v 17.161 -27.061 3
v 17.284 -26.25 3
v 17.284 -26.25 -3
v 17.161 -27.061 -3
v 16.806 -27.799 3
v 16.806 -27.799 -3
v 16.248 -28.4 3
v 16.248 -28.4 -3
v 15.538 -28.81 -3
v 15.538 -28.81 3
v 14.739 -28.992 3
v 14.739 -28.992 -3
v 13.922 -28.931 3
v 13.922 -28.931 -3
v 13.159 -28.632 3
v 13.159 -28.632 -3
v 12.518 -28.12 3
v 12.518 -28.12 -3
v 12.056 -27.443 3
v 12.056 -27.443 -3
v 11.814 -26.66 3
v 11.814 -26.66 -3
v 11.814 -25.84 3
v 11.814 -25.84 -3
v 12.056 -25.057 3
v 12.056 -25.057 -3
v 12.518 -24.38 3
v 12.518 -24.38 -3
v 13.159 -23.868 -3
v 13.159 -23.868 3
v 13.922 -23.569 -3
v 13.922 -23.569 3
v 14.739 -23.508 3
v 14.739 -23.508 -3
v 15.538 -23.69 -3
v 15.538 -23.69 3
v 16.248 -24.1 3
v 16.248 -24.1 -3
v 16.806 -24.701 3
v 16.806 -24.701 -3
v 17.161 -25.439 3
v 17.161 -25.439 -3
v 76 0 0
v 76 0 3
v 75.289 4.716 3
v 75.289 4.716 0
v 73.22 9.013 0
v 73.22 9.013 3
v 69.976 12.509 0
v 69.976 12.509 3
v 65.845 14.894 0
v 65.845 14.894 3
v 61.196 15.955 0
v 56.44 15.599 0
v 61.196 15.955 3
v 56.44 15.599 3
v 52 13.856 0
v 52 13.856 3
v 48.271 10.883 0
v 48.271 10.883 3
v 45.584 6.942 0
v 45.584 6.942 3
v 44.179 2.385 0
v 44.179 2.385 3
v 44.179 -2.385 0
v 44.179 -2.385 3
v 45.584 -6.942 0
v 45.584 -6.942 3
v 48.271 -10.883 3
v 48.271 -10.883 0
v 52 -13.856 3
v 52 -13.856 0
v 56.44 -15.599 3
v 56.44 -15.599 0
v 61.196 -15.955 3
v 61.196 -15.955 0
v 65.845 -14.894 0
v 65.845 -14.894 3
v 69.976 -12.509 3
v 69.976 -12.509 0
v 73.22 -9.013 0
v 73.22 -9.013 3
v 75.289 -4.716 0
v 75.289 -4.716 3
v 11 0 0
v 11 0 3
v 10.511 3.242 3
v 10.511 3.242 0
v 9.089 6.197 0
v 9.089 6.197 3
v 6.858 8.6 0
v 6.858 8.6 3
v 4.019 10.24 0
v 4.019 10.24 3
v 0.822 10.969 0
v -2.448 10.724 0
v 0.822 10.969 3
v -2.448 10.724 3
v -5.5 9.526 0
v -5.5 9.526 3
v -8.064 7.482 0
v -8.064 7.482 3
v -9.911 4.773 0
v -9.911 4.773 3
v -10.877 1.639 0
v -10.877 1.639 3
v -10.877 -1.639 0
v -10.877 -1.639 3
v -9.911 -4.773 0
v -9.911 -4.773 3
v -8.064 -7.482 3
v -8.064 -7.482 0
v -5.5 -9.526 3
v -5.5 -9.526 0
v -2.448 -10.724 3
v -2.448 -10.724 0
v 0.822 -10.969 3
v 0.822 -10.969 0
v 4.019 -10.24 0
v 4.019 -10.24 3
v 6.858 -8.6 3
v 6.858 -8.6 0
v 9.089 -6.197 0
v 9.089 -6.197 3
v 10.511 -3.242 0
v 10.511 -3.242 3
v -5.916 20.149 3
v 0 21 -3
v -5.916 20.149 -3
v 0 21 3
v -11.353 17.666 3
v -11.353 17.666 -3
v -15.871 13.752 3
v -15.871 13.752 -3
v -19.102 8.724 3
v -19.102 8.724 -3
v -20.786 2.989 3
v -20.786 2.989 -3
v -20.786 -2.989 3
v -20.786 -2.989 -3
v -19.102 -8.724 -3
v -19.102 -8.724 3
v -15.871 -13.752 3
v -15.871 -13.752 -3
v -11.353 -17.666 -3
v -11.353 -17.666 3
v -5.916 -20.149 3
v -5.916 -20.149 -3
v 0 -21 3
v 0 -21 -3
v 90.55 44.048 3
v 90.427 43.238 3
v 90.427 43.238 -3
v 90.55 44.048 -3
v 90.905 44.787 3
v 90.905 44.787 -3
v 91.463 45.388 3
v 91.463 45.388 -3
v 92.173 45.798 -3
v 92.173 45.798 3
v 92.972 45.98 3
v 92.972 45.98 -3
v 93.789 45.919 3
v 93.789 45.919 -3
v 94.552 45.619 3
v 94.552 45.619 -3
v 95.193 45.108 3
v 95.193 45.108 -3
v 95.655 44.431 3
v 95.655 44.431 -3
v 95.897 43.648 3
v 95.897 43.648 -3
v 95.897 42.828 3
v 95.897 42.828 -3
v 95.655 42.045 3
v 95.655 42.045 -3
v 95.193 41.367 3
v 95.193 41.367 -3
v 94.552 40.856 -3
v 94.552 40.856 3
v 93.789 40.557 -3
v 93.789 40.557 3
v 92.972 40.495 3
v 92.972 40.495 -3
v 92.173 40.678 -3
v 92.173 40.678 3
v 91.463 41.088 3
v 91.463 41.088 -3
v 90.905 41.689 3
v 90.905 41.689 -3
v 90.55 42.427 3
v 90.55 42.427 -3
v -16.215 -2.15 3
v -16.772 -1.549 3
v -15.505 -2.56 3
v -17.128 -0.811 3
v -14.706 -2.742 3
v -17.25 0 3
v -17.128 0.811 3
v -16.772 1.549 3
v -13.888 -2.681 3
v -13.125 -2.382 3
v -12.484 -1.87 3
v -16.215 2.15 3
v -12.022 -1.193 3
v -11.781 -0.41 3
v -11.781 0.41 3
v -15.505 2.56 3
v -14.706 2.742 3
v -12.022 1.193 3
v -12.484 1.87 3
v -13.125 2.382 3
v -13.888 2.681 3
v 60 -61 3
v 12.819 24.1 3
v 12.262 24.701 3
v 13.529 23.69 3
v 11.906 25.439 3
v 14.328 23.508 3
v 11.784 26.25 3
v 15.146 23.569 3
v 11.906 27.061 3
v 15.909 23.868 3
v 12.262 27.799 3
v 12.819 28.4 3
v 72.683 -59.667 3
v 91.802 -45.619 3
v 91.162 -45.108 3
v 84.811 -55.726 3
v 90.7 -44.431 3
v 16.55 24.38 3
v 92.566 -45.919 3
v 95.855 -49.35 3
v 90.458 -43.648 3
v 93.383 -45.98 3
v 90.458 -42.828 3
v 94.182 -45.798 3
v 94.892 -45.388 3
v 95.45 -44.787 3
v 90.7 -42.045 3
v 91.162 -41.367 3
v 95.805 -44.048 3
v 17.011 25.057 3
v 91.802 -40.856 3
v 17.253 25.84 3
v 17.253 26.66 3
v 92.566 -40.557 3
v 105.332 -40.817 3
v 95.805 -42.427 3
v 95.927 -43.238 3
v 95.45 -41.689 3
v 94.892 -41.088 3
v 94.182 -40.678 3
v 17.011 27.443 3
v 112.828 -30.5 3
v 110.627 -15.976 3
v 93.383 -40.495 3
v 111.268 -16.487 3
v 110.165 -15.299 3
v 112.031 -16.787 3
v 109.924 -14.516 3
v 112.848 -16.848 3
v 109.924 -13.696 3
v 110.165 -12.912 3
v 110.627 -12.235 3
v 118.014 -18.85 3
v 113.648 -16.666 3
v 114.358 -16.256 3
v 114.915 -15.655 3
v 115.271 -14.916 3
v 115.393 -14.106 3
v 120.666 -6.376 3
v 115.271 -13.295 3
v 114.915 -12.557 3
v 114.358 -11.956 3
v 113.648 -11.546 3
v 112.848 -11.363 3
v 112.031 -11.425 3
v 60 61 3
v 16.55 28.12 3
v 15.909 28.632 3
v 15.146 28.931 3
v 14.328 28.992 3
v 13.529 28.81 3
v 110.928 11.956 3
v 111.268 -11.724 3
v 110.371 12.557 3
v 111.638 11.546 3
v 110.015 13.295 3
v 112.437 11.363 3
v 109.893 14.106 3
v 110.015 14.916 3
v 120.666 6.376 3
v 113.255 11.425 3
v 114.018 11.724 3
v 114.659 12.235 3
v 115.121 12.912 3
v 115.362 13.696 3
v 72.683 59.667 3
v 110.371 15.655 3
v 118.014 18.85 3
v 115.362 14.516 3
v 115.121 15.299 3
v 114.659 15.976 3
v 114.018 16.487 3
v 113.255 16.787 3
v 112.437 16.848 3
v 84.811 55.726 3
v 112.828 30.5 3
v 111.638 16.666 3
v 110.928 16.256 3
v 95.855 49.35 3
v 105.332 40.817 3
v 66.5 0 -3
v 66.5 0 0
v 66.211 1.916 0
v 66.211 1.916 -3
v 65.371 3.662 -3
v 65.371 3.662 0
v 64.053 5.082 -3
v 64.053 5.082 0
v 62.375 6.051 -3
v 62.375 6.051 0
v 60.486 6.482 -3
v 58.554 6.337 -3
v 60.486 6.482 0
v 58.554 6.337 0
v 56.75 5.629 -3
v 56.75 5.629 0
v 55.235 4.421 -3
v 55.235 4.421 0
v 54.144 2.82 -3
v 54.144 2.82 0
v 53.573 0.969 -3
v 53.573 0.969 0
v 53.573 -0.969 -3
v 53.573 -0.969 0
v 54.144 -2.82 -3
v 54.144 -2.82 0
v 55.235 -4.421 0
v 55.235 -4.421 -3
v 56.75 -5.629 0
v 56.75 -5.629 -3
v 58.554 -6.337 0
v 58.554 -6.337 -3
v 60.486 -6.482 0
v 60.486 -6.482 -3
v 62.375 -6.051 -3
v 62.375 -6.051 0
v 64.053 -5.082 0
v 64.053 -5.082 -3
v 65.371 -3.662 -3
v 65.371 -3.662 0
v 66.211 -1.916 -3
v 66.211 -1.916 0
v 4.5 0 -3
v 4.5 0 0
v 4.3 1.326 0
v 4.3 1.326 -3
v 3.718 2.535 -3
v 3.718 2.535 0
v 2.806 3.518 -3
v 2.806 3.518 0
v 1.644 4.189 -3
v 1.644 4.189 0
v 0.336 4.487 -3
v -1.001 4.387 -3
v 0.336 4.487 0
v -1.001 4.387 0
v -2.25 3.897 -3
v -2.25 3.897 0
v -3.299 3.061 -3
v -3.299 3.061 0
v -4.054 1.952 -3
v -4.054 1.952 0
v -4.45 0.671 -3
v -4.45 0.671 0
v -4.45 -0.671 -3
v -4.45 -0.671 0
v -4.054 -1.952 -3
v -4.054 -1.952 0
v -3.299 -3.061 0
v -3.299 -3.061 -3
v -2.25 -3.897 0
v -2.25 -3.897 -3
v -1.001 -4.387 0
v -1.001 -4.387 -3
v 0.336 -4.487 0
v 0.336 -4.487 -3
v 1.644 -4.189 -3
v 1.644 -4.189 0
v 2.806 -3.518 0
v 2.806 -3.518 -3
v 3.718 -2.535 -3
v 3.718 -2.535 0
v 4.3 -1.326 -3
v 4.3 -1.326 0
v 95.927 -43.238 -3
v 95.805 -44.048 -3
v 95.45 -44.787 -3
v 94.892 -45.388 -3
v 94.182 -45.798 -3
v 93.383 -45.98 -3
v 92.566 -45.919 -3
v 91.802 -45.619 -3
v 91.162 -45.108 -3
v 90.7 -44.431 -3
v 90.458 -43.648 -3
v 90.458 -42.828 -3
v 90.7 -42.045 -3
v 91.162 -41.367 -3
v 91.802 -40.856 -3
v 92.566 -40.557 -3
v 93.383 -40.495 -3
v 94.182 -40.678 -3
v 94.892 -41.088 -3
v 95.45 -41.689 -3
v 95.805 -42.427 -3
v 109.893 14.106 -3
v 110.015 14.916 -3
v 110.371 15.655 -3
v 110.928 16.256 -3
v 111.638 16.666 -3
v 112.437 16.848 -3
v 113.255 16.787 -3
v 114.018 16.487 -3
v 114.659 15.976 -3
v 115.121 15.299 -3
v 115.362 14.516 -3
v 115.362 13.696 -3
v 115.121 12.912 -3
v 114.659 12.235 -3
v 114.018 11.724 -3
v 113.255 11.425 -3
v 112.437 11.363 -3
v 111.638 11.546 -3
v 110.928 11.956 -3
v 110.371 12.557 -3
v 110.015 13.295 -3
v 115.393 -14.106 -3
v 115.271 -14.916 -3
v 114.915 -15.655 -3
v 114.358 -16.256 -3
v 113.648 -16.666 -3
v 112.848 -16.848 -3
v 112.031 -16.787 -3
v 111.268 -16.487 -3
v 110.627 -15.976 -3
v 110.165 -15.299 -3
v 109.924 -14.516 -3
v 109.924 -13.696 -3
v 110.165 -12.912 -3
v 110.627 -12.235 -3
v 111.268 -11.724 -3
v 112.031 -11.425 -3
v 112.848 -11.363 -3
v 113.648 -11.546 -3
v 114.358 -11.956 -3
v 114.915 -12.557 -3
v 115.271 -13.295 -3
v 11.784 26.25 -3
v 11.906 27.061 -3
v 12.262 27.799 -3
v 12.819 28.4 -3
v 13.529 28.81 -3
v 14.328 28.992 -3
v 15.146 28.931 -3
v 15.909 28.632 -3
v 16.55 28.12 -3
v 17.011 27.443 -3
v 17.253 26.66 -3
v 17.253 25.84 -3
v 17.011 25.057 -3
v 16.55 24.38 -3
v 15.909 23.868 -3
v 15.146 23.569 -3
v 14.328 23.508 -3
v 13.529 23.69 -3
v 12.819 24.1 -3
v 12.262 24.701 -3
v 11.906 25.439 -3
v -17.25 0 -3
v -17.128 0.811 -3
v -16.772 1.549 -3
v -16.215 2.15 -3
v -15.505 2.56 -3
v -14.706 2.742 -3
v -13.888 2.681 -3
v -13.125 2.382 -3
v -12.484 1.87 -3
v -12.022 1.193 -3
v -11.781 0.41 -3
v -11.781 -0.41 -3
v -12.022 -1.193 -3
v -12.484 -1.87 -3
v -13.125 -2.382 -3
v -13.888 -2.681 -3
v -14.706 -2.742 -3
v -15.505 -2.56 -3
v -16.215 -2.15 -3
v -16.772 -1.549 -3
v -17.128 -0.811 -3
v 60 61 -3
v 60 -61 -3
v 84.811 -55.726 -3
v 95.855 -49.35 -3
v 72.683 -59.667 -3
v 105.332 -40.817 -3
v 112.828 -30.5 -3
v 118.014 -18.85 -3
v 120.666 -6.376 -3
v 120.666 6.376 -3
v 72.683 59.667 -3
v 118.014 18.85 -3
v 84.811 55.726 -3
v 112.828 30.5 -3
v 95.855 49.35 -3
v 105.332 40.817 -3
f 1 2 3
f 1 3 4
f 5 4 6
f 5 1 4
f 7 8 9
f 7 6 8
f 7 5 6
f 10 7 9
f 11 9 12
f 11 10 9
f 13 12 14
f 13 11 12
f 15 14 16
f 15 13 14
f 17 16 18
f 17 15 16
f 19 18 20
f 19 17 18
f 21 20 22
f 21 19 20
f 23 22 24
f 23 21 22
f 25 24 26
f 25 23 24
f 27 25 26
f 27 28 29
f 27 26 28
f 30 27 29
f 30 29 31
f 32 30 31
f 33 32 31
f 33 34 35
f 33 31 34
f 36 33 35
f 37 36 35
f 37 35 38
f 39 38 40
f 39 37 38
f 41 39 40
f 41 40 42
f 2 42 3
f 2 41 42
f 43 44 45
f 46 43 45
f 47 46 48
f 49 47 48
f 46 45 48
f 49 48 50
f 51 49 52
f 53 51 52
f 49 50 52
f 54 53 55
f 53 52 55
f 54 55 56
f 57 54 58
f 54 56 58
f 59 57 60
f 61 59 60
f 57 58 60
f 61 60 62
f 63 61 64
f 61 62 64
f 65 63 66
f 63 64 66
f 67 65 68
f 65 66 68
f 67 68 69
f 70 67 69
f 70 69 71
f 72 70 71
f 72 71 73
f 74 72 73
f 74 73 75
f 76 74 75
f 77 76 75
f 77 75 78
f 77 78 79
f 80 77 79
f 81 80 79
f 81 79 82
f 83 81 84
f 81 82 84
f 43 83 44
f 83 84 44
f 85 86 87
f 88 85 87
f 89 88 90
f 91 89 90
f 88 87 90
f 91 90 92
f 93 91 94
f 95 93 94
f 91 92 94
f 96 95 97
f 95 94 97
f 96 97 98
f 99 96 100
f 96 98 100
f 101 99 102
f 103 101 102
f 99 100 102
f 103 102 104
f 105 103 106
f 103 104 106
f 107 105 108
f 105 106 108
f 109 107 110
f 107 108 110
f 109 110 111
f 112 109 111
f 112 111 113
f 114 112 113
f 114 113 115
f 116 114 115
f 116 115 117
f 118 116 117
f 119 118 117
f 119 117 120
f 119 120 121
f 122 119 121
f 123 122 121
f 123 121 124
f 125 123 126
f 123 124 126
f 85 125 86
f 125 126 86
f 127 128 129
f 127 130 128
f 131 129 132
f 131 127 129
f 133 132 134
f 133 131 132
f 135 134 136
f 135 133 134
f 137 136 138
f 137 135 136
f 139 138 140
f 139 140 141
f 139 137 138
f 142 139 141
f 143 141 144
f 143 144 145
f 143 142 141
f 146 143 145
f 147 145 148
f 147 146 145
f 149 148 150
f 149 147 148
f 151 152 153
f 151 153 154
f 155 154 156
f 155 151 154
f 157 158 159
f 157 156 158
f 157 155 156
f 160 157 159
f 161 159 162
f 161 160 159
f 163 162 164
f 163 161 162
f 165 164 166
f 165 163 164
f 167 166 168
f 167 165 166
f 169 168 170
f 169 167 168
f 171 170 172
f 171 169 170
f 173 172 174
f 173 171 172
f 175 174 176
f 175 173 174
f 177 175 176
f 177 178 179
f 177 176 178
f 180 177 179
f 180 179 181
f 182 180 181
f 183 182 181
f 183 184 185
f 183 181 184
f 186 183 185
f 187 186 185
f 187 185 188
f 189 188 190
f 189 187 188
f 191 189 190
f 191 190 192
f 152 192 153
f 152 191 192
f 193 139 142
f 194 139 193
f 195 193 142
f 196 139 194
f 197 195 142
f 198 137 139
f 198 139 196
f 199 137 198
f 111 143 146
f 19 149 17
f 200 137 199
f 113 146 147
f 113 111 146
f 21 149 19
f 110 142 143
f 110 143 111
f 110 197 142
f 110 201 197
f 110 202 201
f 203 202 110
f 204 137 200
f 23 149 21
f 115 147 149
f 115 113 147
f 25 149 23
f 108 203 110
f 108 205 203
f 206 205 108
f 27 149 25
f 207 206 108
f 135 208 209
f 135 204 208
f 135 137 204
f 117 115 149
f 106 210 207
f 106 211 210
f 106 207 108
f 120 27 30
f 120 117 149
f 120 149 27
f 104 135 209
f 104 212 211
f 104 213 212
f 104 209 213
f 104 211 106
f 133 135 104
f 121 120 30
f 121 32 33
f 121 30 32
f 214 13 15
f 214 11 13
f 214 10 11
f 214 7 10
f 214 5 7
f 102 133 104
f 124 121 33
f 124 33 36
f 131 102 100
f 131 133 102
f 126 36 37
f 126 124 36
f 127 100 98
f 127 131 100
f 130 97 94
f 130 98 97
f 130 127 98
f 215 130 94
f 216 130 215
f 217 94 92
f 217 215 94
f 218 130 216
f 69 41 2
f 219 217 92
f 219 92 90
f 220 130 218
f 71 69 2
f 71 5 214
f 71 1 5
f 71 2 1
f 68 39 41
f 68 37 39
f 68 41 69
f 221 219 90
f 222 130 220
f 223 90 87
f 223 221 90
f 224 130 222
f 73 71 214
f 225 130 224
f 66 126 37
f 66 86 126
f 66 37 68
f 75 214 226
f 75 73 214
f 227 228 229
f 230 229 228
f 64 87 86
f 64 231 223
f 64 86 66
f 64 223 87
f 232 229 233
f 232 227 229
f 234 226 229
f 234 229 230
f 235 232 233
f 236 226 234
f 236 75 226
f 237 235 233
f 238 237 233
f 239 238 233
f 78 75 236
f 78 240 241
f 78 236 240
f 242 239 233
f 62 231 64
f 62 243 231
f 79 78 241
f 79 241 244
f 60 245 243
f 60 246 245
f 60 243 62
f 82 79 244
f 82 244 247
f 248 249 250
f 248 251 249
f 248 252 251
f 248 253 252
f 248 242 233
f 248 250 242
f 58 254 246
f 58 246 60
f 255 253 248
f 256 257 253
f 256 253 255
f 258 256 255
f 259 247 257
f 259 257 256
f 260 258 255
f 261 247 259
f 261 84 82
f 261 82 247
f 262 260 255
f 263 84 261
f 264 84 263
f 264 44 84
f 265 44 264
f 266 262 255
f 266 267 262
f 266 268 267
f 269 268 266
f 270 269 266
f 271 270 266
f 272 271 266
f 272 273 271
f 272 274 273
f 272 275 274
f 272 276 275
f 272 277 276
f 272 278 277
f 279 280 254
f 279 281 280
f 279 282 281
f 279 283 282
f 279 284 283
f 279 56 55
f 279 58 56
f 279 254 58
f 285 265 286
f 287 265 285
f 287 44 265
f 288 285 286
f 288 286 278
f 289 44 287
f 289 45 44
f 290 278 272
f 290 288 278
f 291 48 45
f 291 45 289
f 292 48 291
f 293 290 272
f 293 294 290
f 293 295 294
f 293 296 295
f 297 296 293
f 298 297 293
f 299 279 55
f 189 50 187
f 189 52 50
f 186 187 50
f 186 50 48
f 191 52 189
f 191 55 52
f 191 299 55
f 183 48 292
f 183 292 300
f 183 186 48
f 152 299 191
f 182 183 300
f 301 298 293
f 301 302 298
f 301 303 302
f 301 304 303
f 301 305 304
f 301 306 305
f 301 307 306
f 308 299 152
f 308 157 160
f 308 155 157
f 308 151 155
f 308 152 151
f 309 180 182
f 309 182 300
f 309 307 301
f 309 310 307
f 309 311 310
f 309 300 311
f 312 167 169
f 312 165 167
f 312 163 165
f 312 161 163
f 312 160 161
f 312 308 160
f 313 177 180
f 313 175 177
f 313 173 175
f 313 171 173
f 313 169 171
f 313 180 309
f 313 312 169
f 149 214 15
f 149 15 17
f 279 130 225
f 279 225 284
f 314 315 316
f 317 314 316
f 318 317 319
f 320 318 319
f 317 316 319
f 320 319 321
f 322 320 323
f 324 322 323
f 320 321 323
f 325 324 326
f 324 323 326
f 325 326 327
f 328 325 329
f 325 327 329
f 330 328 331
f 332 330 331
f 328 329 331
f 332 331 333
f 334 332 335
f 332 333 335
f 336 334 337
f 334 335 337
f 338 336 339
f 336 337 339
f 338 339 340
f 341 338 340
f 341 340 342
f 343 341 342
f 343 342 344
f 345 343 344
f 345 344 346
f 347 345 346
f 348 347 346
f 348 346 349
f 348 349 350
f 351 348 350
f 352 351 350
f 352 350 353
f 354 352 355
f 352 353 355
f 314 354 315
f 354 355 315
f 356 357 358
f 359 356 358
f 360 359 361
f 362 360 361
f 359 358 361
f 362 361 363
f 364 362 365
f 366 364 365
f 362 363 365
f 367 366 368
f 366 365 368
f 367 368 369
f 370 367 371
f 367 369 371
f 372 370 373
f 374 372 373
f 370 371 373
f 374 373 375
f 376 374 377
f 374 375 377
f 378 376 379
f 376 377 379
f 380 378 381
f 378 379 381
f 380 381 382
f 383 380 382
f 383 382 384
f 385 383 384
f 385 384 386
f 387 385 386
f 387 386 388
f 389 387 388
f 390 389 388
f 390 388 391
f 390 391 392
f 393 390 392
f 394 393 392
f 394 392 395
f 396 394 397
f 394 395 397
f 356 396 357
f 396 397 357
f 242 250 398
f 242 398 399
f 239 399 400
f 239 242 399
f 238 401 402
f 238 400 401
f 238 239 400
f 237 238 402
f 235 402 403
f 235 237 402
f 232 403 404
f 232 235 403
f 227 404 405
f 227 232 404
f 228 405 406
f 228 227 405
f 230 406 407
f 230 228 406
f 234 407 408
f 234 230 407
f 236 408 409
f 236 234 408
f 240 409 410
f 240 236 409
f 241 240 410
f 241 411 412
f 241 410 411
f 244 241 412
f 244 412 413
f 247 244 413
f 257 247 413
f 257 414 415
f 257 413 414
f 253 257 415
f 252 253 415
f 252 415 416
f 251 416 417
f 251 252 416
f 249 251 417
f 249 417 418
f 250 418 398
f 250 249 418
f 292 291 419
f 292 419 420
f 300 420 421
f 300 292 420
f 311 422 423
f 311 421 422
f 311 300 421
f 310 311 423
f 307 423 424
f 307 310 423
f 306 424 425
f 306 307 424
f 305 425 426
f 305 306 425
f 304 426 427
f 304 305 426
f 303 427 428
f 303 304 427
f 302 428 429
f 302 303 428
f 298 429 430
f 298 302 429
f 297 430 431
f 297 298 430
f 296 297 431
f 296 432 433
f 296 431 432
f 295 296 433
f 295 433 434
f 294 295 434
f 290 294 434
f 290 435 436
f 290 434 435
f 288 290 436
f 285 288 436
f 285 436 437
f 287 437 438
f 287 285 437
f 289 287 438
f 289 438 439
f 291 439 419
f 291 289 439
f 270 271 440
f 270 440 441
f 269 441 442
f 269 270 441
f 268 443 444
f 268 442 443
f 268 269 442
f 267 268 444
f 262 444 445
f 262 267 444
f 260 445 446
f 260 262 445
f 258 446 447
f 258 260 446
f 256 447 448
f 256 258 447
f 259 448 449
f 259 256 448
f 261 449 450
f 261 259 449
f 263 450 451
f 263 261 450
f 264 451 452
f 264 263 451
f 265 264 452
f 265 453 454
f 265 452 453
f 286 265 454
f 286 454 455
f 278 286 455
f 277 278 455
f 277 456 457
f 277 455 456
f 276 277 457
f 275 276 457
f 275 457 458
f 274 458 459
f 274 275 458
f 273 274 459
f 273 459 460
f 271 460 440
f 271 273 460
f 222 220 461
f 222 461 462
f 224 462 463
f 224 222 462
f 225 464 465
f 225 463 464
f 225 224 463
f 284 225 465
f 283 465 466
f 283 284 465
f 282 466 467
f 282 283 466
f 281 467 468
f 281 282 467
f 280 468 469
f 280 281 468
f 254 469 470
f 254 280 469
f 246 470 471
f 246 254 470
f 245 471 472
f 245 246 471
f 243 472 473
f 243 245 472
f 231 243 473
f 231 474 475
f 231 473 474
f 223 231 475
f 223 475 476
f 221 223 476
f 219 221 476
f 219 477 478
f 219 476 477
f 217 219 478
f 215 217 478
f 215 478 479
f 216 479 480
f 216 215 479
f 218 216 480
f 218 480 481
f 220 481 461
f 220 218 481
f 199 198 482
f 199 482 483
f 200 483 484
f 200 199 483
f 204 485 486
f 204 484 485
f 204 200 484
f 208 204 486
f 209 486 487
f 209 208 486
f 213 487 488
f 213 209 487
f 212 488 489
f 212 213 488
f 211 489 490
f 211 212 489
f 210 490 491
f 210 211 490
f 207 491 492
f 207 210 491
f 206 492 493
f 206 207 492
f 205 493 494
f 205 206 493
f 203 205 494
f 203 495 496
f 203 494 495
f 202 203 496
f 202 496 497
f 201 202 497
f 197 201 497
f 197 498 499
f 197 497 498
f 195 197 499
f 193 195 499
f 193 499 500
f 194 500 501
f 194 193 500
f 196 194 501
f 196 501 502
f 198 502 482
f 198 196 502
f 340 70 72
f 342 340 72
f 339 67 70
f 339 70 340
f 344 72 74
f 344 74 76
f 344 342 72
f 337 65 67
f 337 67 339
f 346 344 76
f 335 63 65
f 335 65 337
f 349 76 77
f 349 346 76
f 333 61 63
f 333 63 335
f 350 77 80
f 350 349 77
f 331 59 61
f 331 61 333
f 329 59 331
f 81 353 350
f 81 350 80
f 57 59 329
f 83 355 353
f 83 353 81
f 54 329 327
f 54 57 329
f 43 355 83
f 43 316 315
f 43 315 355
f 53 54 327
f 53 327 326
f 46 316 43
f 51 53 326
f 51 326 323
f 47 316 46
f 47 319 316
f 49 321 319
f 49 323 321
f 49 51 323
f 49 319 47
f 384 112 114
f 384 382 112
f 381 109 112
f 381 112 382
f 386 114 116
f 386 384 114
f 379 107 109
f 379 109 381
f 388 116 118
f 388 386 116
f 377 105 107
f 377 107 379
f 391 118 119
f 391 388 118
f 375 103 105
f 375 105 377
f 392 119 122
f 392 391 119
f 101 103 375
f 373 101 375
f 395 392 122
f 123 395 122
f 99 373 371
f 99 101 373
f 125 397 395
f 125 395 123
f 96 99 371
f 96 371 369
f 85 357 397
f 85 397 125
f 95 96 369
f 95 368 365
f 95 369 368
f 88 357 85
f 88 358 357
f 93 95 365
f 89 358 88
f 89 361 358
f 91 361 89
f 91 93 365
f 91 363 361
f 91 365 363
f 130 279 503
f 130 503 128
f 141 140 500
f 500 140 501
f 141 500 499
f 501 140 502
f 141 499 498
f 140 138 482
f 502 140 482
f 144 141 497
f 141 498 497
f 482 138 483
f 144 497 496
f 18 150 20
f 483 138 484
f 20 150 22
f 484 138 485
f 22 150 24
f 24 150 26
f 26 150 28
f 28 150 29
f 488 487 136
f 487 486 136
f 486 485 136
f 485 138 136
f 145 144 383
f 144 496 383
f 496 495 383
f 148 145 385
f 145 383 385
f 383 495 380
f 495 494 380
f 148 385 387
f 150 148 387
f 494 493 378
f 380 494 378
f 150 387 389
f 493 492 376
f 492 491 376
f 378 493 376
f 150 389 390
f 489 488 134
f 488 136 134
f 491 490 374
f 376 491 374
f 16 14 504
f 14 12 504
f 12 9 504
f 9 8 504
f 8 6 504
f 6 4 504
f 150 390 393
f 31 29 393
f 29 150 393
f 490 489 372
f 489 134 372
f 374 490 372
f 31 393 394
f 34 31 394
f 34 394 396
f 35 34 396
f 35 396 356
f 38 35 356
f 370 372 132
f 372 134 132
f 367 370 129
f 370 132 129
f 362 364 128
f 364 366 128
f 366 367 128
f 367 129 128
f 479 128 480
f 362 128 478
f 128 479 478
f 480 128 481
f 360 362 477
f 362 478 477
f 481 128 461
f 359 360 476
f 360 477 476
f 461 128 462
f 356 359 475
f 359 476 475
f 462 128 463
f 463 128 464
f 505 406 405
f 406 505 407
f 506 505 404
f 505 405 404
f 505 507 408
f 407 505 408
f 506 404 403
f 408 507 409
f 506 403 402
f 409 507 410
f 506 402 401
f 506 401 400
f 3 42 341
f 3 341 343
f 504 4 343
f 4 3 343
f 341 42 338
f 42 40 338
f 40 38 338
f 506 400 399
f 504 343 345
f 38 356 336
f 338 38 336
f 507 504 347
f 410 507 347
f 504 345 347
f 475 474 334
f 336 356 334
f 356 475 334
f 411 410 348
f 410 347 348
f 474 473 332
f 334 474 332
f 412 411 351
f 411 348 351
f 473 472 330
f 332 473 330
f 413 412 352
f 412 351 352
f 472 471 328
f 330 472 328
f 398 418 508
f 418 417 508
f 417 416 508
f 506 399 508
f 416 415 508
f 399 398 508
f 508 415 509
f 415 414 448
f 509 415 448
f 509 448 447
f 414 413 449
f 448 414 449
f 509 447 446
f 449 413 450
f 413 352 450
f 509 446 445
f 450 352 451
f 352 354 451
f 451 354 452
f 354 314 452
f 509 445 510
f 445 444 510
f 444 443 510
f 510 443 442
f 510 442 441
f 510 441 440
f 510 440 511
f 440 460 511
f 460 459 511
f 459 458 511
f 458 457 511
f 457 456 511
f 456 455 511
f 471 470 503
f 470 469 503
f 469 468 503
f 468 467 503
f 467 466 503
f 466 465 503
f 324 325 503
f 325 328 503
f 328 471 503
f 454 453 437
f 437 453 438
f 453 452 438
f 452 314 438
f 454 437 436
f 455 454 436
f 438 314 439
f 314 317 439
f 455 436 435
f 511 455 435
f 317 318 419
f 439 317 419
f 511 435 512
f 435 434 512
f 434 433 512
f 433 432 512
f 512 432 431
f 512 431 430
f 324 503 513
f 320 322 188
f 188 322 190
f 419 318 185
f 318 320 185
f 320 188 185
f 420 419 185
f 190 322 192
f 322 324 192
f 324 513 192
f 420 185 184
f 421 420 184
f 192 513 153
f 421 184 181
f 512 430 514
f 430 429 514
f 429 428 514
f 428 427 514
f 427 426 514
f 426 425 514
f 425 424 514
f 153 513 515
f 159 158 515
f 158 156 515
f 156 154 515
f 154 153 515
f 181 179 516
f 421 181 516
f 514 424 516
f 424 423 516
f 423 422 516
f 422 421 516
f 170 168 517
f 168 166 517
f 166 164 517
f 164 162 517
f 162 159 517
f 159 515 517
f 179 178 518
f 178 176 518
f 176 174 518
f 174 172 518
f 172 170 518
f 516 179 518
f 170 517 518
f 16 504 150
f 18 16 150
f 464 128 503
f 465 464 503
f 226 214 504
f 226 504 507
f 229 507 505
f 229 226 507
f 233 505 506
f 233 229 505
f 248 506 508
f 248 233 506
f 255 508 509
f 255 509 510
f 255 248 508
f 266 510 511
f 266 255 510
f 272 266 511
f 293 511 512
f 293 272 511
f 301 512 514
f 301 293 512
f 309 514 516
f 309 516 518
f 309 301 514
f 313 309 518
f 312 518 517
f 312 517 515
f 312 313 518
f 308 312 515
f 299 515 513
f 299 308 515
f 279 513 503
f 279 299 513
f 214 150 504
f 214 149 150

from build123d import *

# Parameters (mm, degrees)
BOSS_EXTRU_1_DEPTH           = 3
ESQUISSE2_R                  = 11
ESQUISSE2_R_2                = 16
ENL_V_MAT_EXTRU_1_DEPTH      = 3
ESQUISSE3_R                  = 4.5
ESQUISSE3_R_2                = 6.5
ENL_V_MAT_EXTRU_2_DEPTH      = 3
ENL_V_MAT_EXTRU_3_DEPTH      = 136.639227364
ENL_V_MAT_EXTRU_3_DEPTH_BACK = 136.639227364
ESQUISSE7_R                  = 2.75


with BuildPart() as part:
    # Esquisse1 → Boss.-Extru.1 (new, symmetric)
    with BuildSketch(Plane.XY):
        with BuildLine():
            Line((0, -21), (60, -61))
            ThreePointArc((60, -61), (121, 0), (60, 61))
            Line((60, 61), (0, 21))
            ThreePointArc((0, 21), (-21, 0), (0, -21))
        make_face()
    extrude(amount=BOSS_EXTRU_1_DEPTH, both=True)

    # Esquisse2 → Enlèv. mat.-Extru.1 (cut)
    with BuildSketch(Plane.XY.offset(3)):
        Circle(ESQUISSE2_R)
        with Locations((60, 0)):
            Circle(ESQUISSE2_R_2)
    extrude(amount=-ENL_V_MAT_EXTRU_1_DEPTH, mode=Mode.SUBTRACT)

    # Esquisse3 → Enlèv. mat.-Extru.2 (cut)
    with BuildSketch(Plane.XY):
        Circle(ESQUISSE3_R)
        with Locations((60, 0)):
            Circle(ESQUISSE3_R_2)
    extrude(amount=-ENL_V_MAT_EXTRU_2_DEPTH, mode=Mode.SUBTRACT)

    # Esquisse7 → Enlèv. mat.-Extru.3 (cut, two sides: drawn at the far end of the back side and taken through both)
    with BuildSketch(Plane(origin=(0, 0, -3), x_dir=(-1, 0, 0), z_dir=(0, 0, -1)).offset(-ENL_V_MAT_EXTRU_3_DEPTH_BACK)):
        with Locations((-93.177497881, 43.237757046)):
            Circle(ESQUISSE7_R)
        with Locations((-112.642957533, 14.105637958)):
            Circle(ESQUISSE7_R)
        with Locations((-93.177497881, -43.237757046)):
            Circle(ESQUISSE7_R)
        with Locations((-112.642957533, -14.105637958)):
            Circle(ESQUISSE7_R)
        with Locations((14.5, 0)):
            Circle(ESQUISSE7_R)
        with Locations((-14.533666301, 26.25)):
            Circle(ESQUISSE7_R)
        with Locations((-14.533666301, -26.25)):
            Circle(ESQUISSE7_R)
    extrude(amount=ENL_V_MAT_EXTRU_3_DEPTH + ENL_V_MAT_EXTRU_3_DEPTH_BACK, mode=Mode.SUBTRACT)


solid = part.part
